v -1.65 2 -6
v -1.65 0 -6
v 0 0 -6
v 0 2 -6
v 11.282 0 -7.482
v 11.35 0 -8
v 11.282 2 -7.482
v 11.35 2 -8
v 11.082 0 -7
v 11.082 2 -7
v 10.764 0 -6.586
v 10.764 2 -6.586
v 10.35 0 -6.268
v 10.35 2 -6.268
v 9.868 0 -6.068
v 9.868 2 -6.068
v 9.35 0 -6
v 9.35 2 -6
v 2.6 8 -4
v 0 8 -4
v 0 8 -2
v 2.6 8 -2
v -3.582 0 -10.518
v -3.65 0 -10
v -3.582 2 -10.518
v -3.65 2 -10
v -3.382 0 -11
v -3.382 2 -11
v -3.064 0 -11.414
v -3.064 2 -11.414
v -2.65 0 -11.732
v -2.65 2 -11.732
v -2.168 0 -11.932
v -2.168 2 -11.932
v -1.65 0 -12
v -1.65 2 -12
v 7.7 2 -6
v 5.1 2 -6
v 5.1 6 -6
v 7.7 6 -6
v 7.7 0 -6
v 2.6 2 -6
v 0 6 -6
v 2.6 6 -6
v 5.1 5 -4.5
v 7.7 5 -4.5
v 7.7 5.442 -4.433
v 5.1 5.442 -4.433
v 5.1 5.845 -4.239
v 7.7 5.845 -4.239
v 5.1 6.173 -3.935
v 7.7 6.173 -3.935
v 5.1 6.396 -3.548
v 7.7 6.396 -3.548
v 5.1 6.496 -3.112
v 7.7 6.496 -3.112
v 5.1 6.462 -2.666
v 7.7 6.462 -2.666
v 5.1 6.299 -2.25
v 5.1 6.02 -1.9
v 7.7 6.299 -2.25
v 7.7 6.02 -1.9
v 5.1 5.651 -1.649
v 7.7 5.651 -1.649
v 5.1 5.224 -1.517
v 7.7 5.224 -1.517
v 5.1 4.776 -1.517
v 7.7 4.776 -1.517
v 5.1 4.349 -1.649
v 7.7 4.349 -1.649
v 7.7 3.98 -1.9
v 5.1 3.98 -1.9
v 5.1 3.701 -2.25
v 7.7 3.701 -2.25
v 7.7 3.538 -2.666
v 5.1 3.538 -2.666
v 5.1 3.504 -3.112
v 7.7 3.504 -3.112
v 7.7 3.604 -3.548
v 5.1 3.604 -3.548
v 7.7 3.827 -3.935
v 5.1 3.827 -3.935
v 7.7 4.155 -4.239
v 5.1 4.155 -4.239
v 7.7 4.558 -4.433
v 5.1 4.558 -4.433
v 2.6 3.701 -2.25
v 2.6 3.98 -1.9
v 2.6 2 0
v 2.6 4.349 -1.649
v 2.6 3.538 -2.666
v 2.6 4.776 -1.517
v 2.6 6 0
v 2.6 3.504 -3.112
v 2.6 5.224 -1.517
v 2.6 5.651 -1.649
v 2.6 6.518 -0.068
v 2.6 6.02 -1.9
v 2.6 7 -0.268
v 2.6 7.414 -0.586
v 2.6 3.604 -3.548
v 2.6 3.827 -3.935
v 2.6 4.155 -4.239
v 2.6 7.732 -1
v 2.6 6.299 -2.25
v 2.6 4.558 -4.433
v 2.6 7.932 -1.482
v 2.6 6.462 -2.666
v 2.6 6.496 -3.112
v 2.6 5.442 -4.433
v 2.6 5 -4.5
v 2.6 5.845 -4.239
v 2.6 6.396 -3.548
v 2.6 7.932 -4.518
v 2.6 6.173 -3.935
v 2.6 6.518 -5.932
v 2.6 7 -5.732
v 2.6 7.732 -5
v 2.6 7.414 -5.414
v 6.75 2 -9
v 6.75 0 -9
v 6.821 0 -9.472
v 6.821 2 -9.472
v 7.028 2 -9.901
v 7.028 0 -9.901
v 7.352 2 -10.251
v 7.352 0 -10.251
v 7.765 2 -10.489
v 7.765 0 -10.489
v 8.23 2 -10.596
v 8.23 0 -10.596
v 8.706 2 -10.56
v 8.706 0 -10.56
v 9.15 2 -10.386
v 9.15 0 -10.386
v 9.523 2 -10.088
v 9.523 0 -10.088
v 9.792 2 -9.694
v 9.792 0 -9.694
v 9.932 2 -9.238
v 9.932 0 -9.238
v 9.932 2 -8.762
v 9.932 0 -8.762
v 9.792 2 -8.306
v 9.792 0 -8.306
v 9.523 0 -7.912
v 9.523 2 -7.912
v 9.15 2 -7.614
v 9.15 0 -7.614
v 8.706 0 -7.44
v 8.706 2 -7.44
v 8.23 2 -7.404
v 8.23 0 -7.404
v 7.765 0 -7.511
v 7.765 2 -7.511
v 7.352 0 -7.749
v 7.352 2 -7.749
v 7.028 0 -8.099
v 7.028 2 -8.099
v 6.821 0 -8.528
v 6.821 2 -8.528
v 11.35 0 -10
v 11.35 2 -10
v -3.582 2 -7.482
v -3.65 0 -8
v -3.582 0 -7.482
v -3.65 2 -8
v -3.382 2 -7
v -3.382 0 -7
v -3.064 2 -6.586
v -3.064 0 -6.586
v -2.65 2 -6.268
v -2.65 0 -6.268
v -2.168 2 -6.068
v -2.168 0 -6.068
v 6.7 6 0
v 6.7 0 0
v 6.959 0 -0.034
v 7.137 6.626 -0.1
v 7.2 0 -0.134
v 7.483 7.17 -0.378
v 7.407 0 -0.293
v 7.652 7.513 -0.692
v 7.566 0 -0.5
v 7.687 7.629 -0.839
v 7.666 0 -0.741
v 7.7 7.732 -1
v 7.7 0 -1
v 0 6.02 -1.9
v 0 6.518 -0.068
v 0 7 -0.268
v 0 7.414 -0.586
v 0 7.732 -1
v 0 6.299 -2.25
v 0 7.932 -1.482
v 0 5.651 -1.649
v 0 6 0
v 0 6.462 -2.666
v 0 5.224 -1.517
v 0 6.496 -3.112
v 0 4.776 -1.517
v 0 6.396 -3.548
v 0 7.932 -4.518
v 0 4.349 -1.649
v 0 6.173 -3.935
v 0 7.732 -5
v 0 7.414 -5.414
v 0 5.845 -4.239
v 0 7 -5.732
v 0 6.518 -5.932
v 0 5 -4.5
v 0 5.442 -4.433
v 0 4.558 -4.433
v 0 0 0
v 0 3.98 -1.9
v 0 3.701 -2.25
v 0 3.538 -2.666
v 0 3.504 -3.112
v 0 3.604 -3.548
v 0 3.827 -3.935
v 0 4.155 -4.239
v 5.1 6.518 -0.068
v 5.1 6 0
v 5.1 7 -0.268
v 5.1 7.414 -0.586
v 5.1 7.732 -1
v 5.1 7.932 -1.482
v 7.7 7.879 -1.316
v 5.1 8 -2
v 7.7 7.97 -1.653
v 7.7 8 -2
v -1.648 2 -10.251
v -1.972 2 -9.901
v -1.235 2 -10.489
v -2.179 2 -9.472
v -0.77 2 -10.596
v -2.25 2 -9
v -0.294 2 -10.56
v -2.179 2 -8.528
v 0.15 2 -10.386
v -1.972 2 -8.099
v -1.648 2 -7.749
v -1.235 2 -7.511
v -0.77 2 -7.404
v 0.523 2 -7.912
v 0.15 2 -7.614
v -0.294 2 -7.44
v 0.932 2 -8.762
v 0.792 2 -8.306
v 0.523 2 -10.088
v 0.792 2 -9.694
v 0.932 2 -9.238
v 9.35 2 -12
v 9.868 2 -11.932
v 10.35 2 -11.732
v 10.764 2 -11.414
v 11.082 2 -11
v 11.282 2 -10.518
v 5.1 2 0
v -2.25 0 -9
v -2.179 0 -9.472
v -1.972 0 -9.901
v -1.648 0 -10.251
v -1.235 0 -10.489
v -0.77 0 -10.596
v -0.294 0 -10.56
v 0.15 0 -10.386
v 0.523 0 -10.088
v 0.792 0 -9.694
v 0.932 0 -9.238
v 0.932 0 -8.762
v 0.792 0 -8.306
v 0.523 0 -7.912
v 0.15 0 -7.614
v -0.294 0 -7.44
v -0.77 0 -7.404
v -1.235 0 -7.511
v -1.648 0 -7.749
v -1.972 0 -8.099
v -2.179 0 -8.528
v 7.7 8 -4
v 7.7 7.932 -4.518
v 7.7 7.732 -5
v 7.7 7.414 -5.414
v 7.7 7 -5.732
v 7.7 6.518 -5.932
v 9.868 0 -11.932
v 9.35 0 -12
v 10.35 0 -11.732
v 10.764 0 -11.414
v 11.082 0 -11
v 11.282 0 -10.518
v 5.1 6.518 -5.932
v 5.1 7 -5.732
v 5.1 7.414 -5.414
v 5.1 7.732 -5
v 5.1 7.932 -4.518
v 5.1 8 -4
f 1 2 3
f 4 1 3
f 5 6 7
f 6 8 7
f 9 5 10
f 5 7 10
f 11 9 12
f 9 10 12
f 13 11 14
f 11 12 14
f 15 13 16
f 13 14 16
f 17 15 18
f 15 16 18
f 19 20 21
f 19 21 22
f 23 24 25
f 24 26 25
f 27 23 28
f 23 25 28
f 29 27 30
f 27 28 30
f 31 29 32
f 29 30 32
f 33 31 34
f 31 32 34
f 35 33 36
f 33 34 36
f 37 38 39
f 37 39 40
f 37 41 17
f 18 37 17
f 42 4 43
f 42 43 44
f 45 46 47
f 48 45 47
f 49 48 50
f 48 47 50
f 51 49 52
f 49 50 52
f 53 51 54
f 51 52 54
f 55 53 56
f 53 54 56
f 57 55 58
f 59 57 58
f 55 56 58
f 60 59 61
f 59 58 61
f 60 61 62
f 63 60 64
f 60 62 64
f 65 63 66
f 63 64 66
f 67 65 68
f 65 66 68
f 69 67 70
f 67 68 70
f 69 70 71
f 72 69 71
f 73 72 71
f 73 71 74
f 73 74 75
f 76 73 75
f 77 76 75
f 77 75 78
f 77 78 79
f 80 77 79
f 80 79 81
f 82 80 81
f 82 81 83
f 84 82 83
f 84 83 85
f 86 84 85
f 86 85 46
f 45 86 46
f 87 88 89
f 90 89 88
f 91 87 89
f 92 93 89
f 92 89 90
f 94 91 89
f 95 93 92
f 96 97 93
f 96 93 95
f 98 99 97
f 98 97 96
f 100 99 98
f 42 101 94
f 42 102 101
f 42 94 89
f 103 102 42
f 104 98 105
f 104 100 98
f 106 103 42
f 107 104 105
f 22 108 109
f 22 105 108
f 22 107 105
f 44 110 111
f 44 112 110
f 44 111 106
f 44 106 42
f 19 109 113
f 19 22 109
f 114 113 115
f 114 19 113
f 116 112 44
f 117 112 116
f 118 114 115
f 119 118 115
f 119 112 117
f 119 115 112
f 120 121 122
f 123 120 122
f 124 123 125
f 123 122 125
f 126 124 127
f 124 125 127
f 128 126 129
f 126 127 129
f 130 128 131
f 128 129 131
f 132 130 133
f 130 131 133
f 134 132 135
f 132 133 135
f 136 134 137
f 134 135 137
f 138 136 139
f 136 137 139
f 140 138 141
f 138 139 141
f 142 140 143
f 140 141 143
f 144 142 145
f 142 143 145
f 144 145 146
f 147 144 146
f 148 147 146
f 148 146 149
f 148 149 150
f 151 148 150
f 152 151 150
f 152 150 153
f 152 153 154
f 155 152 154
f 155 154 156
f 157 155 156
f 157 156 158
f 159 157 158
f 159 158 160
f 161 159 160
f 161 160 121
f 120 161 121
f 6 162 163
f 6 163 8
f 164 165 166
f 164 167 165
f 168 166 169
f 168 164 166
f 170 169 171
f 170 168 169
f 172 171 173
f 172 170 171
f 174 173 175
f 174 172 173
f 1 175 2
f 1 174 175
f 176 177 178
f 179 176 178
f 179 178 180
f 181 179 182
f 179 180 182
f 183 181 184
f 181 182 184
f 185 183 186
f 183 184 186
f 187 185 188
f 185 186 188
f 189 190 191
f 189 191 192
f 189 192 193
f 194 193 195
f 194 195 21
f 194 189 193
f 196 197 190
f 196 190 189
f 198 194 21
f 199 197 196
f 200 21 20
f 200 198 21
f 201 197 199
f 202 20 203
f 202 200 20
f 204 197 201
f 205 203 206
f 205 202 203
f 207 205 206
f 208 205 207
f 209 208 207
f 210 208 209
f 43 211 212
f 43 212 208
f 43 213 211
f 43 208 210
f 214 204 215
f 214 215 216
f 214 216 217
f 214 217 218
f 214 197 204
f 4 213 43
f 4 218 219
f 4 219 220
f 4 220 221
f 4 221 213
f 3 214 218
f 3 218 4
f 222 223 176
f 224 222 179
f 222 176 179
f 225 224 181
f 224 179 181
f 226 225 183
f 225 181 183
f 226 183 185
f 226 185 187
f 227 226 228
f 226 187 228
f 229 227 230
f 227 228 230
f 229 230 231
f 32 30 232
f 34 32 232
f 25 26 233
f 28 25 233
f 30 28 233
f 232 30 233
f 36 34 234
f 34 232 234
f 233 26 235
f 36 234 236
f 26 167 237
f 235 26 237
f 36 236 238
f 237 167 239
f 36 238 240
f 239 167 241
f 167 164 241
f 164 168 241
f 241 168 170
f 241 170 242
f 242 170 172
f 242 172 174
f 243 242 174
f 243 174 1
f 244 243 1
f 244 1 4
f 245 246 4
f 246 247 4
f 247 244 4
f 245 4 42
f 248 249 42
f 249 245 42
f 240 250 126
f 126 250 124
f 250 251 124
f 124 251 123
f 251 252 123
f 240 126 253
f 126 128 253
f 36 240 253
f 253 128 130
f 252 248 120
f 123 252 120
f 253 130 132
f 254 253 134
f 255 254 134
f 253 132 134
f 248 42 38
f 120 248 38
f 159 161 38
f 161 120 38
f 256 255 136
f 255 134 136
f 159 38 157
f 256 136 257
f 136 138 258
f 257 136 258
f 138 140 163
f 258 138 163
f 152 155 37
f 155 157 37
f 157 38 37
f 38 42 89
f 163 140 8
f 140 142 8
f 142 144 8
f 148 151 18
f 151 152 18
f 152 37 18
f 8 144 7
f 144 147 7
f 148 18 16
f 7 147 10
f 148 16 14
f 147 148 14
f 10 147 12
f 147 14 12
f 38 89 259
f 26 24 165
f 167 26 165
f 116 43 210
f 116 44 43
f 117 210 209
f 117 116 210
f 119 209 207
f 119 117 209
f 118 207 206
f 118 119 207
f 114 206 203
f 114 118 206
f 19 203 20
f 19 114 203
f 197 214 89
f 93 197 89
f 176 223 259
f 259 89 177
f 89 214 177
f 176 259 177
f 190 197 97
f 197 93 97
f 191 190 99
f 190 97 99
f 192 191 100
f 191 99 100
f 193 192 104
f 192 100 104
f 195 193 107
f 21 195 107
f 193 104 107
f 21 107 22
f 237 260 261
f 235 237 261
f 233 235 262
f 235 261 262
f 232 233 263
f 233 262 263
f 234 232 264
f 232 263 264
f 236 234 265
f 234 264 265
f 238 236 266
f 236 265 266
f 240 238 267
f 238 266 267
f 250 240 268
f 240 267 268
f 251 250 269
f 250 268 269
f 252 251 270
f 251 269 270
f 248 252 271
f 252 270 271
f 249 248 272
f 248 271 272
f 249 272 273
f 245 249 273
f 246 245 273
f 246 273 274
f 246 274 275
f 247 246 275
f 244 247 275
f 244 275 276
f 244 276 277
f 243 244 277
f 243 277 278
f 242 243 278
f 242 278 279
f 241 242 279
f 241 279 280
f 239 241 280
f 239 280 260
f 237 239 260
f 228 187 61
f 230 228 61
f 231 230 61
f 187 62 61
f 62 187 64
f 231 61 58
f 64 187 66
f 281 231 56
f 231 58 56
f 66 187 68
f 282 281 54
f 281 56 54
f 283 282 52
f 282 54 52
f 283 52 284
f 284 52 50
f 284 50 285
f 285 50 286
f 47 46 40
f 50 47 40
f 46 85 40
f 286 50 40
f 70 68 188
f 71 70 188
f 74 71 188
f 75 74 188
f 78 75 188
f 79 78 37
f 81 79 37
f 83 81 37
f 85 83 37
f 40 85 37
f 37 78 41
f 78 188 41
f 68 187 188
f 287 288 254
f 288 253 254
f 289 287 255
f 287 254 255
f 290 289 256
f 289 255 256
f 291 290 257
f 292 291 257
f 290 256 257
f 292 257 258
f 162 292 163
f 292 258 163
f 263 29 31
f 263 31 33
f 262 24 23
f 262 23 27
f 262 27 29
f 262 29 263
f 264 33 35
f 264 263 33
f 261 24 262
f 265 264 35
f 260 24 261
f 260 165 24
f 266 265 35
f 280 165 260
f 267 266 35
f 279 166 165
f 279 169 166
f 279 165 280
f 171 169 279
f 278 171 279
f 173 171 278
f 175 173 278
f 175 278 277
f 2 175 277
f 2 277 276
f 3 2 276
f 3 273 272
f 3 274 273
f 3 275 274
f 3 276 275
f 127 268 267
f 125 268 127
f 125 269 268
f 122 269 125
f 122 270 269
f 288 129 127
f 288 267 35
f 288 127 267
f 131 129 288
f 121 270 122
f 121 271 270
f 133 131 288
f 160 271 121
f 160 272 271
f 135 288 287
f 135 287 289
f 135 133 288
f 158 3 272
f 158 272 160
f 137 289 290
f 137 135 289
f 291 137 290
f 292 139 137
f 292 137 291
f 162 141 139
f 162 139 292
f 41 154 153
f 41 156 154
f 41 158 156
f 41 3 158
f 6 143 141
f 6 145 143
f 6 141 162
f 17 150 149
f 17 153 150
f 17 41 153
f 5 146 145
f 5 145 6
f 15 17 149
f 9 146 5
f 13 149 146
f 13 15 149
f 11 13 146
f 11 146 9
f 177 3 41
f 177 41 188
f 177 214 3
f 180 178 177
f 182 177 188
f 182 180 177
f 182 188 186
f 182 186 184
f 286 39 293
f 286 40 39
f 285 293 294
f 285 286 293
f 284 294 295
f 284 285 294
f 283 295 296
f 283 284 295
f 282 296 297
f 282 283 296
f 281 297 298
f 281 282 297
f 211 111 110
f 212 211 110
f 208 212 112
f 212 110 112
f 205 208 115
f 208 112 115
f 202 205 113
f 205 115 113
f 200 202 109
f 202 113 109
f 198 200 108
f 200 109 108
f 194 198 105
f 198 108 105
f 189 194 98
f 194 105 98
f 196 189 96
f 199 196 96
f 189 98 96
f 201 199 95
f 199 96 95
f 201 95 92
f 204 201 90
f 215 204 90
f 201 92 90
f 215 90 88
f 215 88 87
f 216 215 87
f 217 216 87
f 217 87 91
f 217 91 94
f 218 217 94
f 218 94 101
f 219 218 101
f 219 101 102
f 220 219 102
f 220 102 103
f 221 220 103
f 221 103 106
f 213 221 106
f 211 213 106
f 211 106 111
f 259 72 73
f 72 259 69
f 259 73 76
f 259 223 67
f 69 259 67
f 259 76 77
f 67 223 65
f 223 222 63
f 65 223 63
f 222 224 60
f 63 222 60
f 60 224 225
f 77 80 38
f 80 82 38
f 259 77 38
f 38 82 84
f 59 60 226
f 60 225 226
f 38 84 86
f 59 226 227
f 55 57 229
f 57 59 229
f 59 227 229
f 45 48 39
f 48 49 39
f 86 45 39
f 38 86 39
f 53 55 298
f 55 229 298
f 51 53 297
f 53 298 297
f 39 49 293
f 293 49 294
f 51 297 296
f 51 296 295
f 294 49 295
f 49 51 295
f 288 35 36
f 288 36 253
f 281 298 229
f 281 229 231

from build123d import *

# Parameters (mm, degrees)
SKETCH1_W             = 7.7
SKETCH1_H             = 6
BOSS_EXTRUDE1_DEPTH   = 8
SKETCH2_W             = 2.5
SKETCH2_H             = 6
CUT_EXTRUDE1_DEPTH    = 6
F_3_0MM_DOWEL_HOLE1_D = 3
SKETCH7_W             = 15
SKETCH7_H             = 6
BOSS_EXTRUDE2_DEPTH   = 2
M3_CLEARANCE_HOLE1_D  = 3.2
FILLET1_R             = 2
FILLET2_R             = 1


with BuildPart() as part:
    # Sketch1 → Boss-Extrude1 (new body)
    with BuildSketch(Plane(origin=(0, 0, 0), x_dir=(1, 0, 0), z_dir=(0, 1, 0))):
        with Locations((3.85, 3)):
            Rectangle(SKETCH1_W, SKETCH1_H)
    extrude(amount=BOSS_EXTRUDE1_DEPTH)

    # Sketch2 → Cut-Extrude1 (cut)
    with BuildSketch(Plane(origin=(0, 8, 0), x_dir=(1, 0, 0), z_dir=(0, 1, 0))):
        with Locations((3.85, 3)):
            Rectangle(SKETCH2_W, SKETCH2_H)
    extrude(amount=-CUT_EXTRUDE1_DEPTH, mode=Mode.SUBTRACT)

    # Ø3.0mm Dowel Hole1 (through all)
    with Locations(Plane.ZY):
        with Locations((-3, 5)):
            Hole(F_3_0MM_DOWEL_HOLE1_D / 2)

    # Sketch7 → Boss-Extrude2 (add)
    with BuildSketch(Plane.XZ):
        with Locations((3.85, -9)):
            Rectangle(SKETCH7_W, SKETCH7_H)
    extrude(amount=-BOSS_EXTRUDE2_DEPTH)

    # M3 Clearance Hole1 (through all)
    with Locations(Plane(origin=(0, 2, 0), x_dir=(1, 0, 0), z_dir=(0, 1, 0))):
        with Locations((-0.65, 9), (8.35, 9)):
            Hole(M3_CLEARANCE_HOLE1_D / 2)

    # Fillet1
    fillet1_edges = [part.edges().sort_by_distance(p)[0] for p in [
        (6.4, 8, 0),
        (1.3, 8, -6),
        (6.4, 8, -6),
        (-3.65, 1, -6),
        (-3.65, 1, -12),
        (11.35, 1, -6),
        (11.35, 1, -12),
        (1.3, 8, 0),
    ]]
    fillet(fillet1_edges, radius=FILLET1_R)

    # Fillet2
    # the kernel refuses this fillet: 1 mm, written as the material it takes off along each edge
    with BuildSketch(Plane(origin=(7.7, -2.5, 0), x_dir=(-1, 0, 0), z_dir=(0, 1, 0))) as fillet2_piece_1:
        with BuildLine():
            CenterArc((FILLET2_R, -FILLET2_R), FILLET2_R, 90, 90)
            Line((0, -FILLET2_R), (0, 0))
            Line((0, 0), (FILLET2_R, 0))
        make_face()
    extrude(amount=11, mode=Mode.SUBTRACT)


solid = part.part
